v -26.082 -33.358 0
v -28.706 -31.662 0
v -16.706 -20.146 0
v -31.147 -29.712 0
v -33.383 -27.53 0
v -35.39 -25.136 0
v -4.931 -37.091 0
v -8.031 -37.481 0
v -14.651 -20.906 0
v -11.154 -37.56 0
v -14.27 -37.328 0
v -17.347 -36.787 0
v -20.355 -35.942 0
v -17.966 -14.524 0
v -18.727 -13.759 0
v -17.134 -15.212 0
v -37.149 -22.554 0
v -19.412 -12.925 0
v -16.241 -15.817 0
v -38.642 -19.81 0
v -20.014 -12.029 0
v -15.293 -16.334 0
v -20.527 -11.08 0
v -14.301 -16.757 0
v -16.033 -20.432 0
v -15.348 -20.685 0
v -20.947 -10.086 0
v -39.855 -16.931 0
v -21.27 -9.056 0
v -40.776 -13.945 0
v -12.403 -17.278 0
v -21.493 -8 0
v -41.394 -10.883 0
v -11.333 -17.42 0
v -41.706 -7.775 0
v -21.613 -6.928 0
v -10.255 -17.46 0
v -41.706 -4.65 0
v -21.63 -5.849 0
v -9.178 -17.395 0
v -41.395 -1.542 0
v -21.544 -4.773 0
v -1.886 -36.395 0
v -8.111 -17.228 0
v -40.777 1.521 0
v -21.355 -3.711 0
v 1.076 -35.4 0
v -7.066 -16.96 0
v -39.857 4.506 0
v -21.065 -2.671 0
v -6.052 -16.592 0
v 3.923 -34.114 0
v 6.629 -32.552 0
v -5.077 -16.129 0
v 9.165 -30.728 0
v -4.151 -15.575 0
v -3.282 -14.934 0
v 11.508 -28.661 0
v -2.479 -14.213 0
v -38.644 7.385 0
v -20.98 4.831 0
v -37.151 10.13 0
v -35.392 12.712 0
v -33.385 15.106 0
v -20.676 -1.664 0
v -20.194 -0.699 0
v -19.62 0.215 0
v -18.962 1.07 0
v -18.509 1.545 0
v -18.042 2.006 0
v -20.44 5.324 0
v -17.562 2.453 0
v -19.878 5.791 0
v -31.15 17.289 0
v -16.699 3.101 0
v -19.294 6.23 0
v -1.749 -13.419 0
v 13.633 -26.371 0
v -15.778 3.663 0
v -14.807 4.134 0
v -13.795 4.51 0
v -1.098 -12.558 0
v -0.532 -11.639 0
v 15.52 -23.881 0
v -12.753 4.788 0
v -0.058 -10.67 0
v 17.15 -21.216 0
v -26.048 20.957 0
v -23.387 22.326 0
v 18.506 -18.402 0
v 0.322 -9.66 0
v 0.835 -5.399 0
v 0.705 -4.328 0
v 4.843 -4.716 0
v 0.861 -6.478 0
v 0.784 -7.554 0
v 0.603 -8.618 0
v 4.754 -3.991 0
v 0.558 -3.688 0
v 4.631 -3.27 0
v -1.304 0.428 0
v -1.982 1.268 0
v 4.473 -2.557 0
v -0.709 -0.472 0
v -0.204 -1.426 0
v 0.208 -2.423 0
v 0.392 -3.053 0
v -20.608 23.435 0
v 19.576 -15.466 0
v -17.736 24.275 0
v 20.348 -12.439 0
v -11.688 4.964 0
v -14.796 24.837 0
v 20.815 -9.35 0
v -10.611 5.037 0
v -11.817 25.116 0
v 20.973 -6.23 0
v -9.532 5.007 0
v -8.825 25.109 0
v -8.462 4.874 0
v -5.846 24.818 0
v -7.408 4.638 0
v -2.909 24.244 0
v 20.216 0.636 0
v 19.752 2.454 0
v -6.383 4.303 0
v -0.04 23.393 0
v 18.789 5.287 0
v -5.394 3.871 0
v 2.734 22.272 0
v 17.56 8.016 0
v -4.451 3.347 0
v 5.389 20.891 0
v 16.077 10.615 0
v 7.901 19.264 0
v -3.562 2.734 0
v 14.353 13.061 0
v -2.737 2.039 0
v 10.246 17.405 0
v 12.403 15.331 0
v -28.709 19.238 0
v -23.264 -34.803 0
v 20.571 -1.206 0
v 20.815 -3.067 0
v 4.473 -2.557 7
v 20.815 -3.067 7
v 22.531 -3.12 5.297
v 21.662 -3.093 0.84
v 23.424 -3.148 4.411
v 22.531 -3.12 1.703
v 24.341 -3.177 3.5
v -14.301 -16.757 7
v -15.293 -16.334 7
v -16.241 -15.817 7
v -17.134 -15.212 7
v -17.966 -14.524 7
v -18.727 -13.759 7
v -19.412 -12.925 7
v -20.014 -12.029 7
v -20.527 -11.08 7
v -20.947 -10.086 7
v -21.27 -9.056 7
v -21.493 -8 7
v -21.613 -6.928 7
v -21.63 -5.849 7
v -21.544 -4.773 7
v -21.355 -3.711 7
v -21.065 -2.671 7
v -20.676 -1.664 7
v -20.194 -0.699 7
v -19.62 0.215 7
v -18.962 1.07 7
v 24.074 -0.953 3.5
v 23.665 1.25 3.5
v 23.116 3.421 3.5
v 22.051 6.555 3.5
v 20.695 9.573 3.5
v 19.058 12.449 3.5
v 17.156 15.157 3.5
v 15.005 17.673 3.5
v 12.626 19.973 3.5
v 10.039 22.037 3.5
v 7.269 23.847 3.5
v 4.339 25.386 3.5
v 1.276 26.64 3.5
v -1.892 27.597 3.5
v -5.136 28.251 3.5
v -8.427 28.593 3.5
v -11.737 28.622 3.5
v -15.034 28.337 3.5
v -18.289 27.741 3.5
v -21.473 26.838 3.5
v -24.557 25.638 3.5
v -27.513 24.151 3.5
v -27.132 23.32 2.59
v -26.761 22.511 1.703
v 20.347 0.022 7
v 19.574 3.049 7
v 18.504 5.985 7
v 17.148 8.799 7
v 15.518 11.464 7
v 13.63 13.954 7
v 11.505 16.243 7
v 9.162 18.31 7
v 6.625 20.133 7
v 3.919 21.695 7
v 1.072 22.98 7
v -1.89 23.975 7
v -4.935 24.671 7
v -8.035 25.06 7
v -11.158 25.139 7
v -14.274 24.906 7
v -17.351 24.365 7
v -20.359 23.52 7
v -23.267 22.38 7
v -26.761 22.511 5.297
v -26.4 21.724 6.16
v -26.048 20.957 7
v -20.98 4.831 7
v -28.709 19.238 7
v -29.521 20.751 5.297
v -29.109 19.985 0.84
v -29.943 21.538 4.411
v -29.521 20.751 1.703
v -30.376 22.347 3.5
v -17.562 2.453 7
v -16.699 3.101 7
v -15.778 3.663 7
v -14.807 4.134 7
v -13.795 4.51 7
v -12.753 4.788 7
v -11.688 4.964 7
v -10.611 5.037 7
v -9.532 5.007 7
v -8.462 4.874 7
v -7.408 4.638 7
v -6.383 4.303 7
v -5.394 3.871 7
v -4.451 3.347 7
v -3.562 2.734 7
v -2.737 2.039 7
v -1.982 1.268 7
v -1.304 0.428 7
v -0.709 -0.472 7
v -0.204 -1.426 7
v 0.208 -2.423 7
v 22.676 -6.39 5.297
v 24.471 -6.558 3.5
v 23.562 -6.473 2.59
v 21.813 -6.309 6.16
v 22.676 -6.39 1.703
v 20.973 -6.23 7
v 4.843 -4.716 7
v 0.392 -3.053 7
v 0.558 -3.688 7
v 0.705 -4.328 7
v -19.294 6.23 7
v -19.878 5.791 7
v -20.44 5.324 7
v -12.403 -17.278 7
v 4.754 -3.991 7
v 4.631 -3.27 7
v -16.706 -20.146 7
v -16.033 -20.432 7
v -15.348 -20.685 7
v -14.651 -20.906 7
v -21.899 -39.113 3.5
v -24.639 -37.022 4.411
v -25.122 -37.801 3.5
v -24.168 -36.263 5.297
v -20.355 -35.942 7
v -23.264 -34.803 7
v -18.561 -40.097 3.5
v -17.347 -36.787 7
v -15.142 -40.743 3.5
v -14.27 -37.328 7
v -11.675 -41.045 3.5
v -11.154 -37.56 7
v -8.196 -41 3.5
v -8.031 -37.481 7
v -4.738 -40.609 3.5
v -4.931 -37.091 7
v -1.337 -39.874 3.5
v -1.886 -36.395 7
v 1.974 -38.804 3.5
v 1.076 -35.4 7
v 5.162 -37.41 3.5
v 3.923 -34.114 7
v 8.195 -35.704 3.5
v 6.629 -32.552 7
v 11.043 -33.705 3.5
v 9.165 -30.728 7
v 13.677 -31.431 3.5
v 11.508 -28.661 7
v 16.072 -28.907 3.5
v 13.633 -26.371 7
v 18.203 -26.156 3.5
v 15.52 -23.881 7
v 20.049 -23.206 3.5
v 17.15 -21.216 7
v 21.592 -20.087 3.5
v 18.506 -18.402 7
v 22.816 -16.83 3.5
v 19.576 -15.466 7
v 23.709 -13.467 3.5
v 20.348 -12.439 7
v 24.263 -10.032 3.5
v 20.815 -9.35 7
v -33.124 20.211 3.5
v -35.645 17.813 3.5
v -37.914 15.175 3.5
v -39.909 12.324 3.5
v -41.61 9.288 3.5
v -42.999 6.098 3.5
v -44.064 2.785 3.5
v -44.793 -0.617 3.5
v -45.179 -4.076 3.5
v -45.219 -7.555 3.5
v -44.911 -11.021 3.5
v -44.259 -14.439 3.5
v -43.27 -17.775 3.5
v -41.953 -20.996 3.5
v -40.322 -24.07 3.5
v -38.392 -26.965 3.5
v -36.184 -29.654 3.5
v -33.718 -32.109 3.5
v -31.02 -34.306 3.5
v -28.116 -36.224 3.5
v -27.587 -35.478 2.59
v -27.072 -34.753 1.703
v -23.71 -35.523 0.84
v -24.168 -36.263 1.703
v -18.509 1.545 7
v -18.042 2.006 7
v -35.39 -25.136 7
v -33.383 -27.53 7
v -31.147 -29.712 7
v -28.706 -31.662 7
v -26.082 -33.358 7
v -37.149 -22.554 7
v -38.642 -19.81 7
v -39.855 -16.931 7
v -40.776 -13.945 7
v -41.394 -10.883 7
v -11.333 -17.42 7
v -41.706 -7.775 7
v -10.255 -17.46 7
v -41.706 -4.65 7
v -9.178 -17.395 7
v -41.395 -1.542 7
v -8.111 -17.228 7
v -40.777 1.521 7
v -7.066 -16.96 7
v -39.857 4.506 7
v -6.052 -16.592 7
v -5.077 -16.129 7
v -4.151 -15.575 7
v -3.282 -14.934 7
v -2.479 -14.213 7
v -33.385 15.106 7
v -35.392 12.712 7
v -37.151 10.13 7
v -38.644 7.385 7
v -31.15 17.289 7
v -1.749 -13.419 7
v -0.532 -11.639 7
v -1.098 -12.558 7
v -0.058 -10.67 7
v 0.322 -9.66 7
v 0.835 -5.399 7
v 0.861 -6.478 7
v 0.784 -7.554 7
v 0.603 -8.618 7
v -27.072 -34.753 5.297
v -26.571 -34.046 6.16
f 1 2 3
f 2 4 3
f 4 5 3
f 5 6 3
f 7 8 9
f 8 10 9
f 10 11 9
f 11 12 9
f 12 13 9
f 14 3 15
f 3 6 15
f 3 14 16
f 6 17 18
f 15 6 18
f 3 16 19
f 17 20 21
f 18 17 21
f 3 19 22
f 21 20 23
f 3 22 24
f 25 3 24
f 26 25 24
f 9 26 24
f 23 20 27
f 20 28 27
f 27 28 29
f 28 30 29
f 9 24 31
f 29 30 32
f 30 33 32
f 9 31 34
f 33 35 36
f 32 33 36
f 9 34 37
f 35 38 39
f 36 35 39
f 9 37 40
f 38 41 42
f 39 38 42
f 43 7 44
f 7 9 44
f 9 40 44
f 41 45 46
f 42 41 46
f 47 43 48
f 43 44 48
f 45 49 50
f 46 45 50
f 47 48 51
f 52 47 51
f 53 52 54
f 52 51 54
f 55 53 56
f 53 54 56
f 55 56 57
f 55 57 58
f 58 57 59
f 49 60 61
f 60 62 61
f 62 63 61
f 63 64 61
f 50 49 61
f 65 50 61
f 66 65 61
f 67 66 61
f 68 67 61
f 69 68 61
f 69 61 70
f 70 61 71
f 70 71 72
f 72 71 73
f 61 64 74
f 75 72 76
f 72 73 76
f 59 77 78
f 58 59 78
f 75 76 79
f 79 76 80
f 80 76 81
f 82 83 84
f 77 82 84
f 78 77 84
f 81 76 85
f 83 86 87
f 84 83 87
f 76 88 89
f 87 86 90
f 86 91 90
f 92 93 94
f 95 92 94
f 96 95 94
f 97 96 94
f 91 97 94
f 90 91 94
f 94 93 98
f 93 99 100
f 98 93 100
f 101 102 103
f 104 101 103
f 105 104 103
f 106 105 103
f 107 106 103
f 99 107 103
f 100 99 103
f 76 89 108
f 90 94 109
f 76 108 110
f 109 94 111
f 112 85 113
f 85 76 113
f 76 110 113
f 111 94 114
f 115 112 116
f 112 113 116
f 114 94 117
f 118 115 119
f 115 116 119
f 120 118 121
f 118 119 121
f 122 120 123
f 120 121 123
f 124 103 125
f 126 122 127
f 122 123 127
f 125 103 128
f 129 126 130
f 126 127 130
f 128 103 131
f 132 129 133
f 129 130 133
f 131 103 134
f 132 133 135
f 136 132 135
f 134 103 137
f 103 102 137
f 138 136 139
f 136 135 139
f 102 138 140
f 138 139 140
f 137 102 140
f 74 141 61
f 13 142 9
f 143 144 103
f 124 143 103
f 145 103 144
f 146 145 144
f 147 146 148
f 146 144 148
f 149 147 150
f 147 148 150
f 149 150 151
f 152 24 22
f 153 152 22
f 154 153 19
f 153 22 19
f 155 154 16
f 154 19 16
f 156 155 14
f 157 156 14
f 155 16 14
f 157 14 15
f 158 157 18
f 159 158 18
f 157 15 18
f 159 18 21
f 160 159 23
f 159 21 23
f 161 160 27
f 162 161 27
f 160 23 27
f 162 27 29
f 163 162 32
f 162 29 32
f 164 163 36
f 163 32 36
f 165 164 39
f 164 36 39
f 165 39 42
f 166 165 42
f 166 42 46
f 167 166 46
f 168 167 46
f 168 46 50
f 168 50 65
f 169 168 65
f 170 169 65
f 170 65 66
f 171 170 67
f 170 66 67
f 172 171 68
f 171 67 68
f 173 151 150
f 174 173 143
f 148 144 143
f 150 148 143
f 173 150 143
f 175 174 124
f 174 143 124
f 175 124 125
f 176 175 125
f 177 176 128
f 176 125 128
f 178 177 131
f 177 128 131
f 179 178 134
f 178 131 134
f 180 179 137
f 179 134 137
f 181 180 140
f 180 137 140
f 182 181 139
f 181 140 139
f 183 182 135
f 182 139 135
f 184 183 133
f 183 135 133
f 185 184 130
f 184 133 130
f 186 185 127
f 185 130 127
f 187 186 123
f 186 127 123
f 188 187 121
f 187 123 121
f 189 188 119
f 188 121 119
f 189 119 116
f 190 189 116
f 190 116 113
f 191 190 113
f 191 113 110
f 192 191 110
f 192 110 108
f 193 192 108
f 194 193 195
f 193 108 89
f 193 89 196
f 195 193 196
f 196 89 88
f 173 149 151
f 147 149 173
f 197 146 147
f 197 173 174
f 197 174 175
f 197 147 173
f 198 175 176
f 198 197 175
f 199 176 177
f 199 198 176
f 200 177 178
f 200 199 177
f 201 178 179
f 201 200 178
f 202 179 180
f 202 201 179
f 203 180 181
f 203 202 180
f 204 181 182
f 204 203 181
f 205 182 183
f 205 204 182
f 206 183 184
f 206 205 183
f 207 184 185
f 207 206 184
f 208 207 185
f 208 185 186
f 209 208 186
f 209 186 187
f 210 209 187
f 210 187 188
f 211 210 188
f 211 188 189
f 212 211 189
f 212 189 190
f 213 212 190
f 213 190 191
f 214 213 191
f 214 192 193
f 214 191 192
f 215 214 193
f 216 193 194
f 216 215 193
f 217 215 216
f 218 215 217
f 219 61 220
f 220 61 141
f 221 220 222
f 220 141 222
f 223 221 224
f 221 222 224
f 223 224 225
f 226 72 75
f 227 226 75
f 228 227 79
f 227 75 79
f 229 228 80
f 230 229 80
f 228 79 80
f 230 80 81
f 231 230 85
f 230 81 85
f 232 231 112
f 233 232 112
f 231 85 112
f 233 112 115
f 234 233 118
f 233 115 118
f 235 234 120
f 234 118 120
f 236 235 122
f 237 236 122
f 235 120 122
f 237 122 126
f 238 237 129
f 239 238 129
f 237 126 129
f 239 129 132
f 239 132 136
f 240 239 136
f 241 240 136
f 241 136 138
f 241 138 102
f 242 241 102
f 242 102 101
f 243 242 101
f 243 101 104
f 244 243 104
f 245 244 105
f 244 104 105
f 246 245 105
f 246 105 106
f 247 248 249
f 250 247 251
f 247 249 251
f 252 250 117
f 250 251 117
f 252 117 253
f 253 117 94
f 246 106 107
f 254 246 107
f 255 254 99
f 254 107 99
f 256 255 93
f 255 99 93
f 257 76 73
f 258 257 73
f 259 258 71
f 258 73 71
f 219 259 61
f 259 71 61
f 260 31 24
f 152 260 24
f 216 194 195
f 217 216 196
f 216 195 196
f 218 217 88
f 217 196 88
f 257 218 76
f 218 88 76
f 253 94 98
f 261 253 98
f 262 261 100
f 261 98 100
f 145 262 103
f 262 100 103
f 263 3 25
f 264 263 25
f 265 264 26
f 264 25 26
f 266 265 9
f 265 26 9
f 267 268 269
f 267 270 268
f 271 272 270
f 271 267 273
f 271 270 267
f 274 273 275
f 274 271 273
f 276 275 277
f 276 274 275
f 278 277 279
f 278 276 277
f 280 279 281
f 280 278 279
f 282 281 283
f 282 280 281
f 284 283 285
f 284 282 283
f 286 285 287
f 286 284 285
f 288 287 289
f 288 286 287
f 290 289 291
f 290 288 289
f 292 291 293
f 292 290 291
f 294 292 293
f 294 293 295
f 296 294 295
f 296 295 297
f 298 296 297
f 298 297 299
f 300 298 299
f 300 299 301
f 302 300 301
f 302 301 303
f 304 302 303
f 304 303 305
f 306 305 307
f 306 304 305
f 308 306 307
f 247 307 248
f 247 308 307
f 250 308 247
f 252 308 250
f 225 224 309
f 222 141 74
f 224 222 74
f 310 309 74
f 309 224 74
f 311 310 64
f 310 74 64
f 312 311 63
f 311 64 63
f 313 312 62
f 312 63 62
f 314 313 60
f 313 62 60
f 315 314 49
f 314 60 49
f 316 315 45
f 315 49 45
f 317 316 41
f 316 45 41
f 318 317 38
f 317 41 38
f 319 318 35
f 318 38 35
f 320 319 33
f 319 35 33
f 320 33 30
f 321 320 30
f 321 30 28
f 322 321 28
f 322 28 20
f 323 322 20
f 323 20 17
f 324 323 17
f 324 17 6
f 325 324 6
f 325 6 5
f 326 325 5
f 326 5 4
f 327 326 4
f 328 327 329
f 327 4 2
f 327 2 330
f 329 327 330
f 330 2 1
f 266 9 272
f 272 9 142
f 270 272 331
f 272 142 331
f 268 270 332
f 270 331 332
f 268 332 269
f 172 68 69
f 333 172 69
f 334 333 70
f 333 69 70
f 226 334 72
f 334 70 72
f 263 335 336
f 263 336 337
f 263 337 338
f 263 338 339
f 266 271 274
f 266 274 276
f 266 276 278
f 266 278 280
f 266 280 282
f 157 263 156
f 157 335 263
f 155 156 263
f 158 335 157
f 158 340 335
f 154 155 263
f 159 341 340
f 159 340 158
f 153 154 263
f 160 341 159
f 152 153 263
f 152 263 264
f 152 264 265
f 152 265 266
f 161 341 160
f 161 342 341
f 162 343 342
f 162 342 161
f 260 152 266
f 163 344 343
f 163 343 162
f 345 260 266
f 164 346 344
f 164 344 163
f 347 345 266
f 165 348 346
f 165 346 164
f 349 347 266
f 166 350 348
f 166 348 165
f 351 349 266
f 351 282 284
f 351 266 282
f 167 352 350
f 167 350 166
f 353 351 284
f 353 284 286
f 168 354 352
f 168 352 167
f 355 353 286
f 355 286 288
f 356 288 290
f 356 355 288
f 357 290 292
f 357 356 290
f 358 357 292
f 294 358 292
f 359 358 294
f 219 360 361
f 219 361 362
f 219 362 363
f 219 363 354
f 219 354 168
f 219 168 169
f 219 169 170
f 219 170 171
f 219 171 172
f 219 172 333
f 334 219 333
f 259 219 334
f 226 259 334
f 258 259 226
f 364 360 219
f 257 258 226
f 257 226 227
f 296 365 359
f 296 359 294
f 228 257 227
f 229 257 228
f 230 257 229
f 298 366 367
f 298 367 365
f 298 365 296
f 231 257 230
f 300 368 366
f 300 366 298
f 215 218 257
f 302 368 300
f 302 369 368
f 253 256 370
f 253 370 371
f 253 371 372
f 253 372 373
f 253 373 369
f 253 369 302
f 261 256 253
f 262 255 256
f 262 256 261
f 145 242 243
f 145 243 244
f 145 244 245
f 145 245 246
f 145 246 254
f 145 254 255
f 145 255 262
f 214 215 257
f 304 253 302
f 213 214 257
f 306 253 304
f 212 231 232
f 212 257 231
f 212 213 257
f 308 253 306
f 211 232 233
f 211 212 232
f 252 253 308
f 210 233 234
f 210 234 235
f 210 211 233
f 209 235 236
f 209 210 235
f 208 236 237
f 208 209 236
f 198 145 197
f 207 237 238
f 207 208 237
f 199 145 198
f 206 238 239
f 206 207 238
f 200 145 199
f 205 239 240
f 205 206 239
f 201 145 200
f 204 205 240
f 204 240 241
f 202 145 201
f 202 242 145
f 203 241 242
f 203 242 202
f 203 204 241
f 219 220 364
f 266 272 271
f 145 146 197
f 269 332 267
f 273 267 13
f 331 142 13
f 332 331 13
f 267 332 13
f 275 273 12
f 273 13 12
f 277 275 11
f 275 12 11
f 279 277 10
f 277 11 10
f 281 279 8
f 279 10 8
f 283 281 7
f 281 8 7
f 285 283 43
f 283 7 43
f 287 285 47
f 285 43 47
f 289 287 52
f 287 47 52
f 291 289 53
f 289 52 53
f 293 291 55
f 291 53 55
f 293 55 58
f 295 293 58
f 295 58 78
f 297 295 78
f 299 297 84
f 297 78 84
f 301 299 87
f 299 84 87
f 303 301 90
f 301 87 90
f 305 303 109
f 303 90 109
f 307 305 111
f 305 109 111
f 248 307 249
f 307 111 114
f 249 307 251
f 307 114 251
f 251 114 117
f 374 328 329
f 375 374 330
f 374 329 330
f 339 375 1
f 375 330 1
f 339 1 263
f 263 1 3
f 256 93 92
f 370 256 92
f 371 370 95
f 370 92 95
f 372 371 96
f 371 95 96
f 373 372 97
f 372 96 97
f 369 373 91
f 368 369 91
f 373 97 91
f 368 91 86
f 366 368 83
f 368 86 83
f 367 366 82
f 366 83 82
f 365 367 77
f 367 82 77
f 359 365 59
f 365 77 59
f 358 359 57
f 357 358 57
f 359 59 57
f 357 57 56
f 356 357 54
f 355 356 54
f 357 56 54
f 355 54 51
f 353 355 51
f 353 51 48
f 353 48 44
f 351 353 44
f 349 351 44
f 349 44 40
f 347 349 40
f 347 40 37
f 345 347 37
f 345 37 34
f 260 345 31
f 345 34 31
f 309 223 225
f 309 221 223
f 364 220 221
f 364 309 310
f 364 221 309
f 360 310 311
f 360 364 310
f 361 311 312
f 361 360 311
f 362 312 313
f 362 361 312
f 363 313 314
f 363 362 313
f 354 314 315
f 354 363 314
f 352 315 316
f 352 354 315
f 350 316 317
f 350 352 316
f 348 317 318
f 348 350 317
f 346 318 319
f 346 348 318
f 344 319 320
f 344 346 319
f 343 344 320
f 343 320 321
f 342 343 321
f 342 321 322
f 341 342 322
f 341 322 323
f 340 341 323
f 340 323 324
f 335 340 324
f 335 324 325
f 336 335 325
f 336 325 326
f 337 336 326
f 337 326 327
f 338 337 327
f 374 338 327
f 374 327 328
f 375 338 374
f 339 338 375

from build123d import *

# Parameters (mm, degrees)
F1_DEPTH     = 7
F2_T2_ANGLE  = 147.8228871573
F2_T4_ANGLE  = 147.8228871573
F2_T6_ANGLE  = 147.8228871573
F2_T8_ANGLE  = 147.8228871573
F2_T10_ANGLE = 147.8228871573
F2_T12_ANGLE = 147.8228871573


# Not quite as in the source:
# - a fillet or chamfer that OpenCascade refuses, or shapes differently, is made with other operations: its cross-section is extruded or revolved along the edge and cut away or added


with BuildPart() as f1:
    # F0 (on Top) → F1 (new body)
    with BuildSketch(Plane.XY):
        with BuildLine():
            Line((-28.4060324401, -36.6326823344), (-16.7057452382, -20.1458706432))
            ThreePointArc((-16.7057452382, -20.1458706432), (-25.4681782111, -8.7912963767), (-20.97968548, 4.8307453711))
            Line((-20.97968548, 4.8307453711), (-30.6144689612, 22.7902857677))
            ThreePointArc((-30.6144689612, 22.7902857677), (-45.7201890255, -7.5236357069), (-28.4060324401, -36.6326823344))
        make_face()
        with BuildLine():
            ThreePointArc((-19.29435824, 6.2304415143), (-5.0797919896, 8.1416439346), (4.4729958499, -2.5565256692))
            Line((4.4729958499, -2.5565256692), (24.8438058142, -3.1923286128))
            ThreePointArc((24.8438058142, -3.1923286128), (6.144039761, 25.0465694426), (-27.722212391, 24.6065933083))
            Line((-27.722212391, 24.6065933083), (-19.29435824, 6.2304415143))
        make_face()
        with BuildLine():
            ThreePointArc((4.9156669829, -6.2104463577), (-1.1968722093, -18.4456132191), (-14.6509092006, -20.9055587751))
            Line((-14.6509092006, -20.9055587751), (-25.3869356838, -38.229296228))
            ThreePointArc((-25.3869356838, -38.229296228), (8.4185504337, -36.154272809), (24.9706460004, -6.6052500471))
            Line((24.9706460004, -6.6052500471), (4.8425046474, -4.7159099443))
            ThreePointArc((4.8425046474, -4.7159099443), (4.8973654542, -5.4622833042), (4.9156669829, -6.2104463577))
        make_face()
        with BuildLine():
            Line((-16.7057452382, -20.1458706432), (-14.3009175091, -16.7572408399))
            ThreePointArc((-14.3009175091, -16.7572408399), (-21.2699622014, -9.0563128177), (-18.9622633915, 1.0702069463))
            Line((-18.9622633915, 1.0702069463), (-20.97968548, 4.8307453711))
            ThreePointArc((-20.97968548, 4.8307453711), (-25.4681782111, -8.7912963767), (-16.7057452382, -20.1458706432))
        make_face()
        with BuildLine():
            ThreePointArc((-17.5621326109, 2.4534847075), (-7.4084109648, 4.63839044), (0.2075629978, -2.4233952356))
            Line((0.2075629978, -2.4233952356), (4.4729958499, -2.5565256692))
            ThreePointArc((4.4729958499, -2.5565256692), (-5.0797919896, 8.1416439346), (-19.29435824, 6.2304415143))
            Line((-19.29435824, 6.2304415143), (-17.5621326109, 2.4534847075))
        make_face()
        with BuildLine():
            ThreePointArc((0.7054512892, -4.3275829408), (-2.4792256646, -14.2134166955), (-12.4028984371, -17.2781507839))
            Line((-12.4028984371, -17.2781507839), (-14.6509092006, -20.9055587751))
            ThreePointArc((-14.6509092006, -20.9055587751), (-1.1968722093, -18.4456132191), (4.9156669829, -6.2104463577))
            ThreePointArc((4.9156669829, -6.2104463577), (4.8973654542, -5.4622833042), (4.8425046474, -4.7159099443))
            Line((4.8425046474, -4.7159099443), (0.7054512892, -4.3275829408))
        make_face()
        with BuildLine():
            Line((-20.97968548, 4.8307453711), (-18.9622633915, 1.0702069463))
            ThreePointArc((-18.9622633915, 1.0702069463), (-18.2773306397, 1.7771628324), (-17.5621326109, 2.4534847075))
            Line((-17.5621326109, 2.4534847075), (-19.29435824, 6.2304415143))
            ThreePointArc((-19.29435824, 6.2304415143), (-20.1621039238, 5.5607939156), (-20.97968548, 4.8307453711))
        make_face()
        with BuildLine():
            ThreePointArc((0.2075629978, -2.4233952356), (0.4773383786, -3.3700423415), (0.7054512892, -4.3275829408))
            Line((0.7054512892, -4.3275829408), (4.8425046474, -4.7159099443))
            ThreePointArc((4.8425046474, -4.7159099443), (4.6964456573, -3.6295963387), (4.4729958499, -2.5565256692))
            Line((4.4729958499, -2.5565256692), (0.2075629978, -2.4233952356))
        make_face()
        with BuildLine():
            Line((-14.6509092006, -20.9055587751), (-12.4028984371, -17.2781507839))
            Line((-12.4028984371, -17.2781507839), (-14.3009175091, -16.7572408399))
            Line((-14.3009175091, -16.7572408399), (-16.7057452382, -20.1458706432))
            ThreePointArc((-16.7057452382, -20.1458706432), (-15.6919405642, -20.56253665), (-14.6509092006, -20.9055587751))
        make_face()
    extrude(amount=F1_DEPTH)

    # F2: chamfer of 4 on 6 edges, made by hand

    # F2_s1 → F2_t2 (revolve, cut)
    with BuildSketch(Plane(origin=(-11.2150452206, -3.6909975733, 0), x_dir=(0, 0, 1), z_dir=(0.9498795724, 0.3126160553, 0))):
        Polygon((3, -32.7063288851), (7, -28.7063288851), (7, -32.7063288851), align=None)
    revolve(axis=Axis((-10.3858662769, -6.2104463577, 7), (0, 0, 1)), revolution_arc=F2_T2_ANGLE, mode=Mode.SUBTRACT)

    # F2_s3 → F2_t4 (revolve, cut)
    with BuildSketch(Plane(origin=(-11.2150452206, -3.6909975733, 0), x_dir=(0, 0, 1), z_dir=(0.9498795724, 0.3126160553, 0))):
        Polygon((4, -32.7063288851), (0, -28.7063288851), (0, -32.7063288851), align=None)
    revolve(axis=Axis((-10.3858662769, -6.2104463577, 0), (0, 0, 1)), revolution_arc=F2_T4_ANGLE, mode=Mode.SUBTRACT)

    # F2_s5 → F2_t6 (revolve, cut)
    with BuildSketch(Plane(origin=(-2.6891726039, 2.4029660659, 0), x_dir=(0, 0, 1), z_dir=(-0.7456732317, 0.6663118126, 0))):
        Polygon((3, -46.9099054592), (7, -42.9099054592), (7, -46.9099054592), align=None)
    revolve(axis=Axis((-10.3858662769, -6.2104463577, 7), (0, 0, 1)), revolution_arc=F2_T6_ANGLE, mode=Mode.SUBTRACT)

    # F2_s7 → F2_t8 (revolve, cut)
    with BuildSketch(Plane(origin=(-2.6891726039, 2.4029660659, 0), x_dir=(0, 0, 1), z_dir=(-0.7456732317, 0.6663118126, 0))):
        Polygon((4, -46.9099054592), (0, -42.9099054592), (0, -46.9099054592), align=None)
    revolve(axis=Axis((-10.3858662769, -6.2104463577, 0), (0, 0, 1)), revolution_arc=F2_T8_ANGLE, mode=Mode.SUBTRACT)

    # F2_s9 → F2_t10 (revolve, cut)
    with BuildSketch(Plane(origin=(-1.6745815909, -8.0276380292, 0), x_dir=(0, 0, 1), z_dir=(-0.2042063407, -0.9789278678, 0))):
        Polygon((3, -26.4599150641), (7, -22.4599150641), (7, -26.4599150641), align=None)
    revolve(axis=Axis((-10.3858662769, -6.2104463577, 7), (0, 0, 1)), revolution_arc=F2_T10_ANGLE, mode=Mode.SUBTRACT)

    # F2_s11 → F2_t12 (revolve, cut)
    with BuildSketch(Plane(origin=(-1.6745815909, -8.0276380292, 0), x_dir=(0, 0, 1), z_dir=(-0.2042063407, -0.9789278678, 0))):
        Polygon((4, -26.4599150641), (0, -22.4599150641), (0, -26.4599150641), align=None)
    revolve(axis=Axis((-10.3858662769, -6.2104463577, 0), (0, 0, 1)), revolution_arc=F2_T12_ANGLE, mode=Mode.SUBTRACT)


solid = f1.part
